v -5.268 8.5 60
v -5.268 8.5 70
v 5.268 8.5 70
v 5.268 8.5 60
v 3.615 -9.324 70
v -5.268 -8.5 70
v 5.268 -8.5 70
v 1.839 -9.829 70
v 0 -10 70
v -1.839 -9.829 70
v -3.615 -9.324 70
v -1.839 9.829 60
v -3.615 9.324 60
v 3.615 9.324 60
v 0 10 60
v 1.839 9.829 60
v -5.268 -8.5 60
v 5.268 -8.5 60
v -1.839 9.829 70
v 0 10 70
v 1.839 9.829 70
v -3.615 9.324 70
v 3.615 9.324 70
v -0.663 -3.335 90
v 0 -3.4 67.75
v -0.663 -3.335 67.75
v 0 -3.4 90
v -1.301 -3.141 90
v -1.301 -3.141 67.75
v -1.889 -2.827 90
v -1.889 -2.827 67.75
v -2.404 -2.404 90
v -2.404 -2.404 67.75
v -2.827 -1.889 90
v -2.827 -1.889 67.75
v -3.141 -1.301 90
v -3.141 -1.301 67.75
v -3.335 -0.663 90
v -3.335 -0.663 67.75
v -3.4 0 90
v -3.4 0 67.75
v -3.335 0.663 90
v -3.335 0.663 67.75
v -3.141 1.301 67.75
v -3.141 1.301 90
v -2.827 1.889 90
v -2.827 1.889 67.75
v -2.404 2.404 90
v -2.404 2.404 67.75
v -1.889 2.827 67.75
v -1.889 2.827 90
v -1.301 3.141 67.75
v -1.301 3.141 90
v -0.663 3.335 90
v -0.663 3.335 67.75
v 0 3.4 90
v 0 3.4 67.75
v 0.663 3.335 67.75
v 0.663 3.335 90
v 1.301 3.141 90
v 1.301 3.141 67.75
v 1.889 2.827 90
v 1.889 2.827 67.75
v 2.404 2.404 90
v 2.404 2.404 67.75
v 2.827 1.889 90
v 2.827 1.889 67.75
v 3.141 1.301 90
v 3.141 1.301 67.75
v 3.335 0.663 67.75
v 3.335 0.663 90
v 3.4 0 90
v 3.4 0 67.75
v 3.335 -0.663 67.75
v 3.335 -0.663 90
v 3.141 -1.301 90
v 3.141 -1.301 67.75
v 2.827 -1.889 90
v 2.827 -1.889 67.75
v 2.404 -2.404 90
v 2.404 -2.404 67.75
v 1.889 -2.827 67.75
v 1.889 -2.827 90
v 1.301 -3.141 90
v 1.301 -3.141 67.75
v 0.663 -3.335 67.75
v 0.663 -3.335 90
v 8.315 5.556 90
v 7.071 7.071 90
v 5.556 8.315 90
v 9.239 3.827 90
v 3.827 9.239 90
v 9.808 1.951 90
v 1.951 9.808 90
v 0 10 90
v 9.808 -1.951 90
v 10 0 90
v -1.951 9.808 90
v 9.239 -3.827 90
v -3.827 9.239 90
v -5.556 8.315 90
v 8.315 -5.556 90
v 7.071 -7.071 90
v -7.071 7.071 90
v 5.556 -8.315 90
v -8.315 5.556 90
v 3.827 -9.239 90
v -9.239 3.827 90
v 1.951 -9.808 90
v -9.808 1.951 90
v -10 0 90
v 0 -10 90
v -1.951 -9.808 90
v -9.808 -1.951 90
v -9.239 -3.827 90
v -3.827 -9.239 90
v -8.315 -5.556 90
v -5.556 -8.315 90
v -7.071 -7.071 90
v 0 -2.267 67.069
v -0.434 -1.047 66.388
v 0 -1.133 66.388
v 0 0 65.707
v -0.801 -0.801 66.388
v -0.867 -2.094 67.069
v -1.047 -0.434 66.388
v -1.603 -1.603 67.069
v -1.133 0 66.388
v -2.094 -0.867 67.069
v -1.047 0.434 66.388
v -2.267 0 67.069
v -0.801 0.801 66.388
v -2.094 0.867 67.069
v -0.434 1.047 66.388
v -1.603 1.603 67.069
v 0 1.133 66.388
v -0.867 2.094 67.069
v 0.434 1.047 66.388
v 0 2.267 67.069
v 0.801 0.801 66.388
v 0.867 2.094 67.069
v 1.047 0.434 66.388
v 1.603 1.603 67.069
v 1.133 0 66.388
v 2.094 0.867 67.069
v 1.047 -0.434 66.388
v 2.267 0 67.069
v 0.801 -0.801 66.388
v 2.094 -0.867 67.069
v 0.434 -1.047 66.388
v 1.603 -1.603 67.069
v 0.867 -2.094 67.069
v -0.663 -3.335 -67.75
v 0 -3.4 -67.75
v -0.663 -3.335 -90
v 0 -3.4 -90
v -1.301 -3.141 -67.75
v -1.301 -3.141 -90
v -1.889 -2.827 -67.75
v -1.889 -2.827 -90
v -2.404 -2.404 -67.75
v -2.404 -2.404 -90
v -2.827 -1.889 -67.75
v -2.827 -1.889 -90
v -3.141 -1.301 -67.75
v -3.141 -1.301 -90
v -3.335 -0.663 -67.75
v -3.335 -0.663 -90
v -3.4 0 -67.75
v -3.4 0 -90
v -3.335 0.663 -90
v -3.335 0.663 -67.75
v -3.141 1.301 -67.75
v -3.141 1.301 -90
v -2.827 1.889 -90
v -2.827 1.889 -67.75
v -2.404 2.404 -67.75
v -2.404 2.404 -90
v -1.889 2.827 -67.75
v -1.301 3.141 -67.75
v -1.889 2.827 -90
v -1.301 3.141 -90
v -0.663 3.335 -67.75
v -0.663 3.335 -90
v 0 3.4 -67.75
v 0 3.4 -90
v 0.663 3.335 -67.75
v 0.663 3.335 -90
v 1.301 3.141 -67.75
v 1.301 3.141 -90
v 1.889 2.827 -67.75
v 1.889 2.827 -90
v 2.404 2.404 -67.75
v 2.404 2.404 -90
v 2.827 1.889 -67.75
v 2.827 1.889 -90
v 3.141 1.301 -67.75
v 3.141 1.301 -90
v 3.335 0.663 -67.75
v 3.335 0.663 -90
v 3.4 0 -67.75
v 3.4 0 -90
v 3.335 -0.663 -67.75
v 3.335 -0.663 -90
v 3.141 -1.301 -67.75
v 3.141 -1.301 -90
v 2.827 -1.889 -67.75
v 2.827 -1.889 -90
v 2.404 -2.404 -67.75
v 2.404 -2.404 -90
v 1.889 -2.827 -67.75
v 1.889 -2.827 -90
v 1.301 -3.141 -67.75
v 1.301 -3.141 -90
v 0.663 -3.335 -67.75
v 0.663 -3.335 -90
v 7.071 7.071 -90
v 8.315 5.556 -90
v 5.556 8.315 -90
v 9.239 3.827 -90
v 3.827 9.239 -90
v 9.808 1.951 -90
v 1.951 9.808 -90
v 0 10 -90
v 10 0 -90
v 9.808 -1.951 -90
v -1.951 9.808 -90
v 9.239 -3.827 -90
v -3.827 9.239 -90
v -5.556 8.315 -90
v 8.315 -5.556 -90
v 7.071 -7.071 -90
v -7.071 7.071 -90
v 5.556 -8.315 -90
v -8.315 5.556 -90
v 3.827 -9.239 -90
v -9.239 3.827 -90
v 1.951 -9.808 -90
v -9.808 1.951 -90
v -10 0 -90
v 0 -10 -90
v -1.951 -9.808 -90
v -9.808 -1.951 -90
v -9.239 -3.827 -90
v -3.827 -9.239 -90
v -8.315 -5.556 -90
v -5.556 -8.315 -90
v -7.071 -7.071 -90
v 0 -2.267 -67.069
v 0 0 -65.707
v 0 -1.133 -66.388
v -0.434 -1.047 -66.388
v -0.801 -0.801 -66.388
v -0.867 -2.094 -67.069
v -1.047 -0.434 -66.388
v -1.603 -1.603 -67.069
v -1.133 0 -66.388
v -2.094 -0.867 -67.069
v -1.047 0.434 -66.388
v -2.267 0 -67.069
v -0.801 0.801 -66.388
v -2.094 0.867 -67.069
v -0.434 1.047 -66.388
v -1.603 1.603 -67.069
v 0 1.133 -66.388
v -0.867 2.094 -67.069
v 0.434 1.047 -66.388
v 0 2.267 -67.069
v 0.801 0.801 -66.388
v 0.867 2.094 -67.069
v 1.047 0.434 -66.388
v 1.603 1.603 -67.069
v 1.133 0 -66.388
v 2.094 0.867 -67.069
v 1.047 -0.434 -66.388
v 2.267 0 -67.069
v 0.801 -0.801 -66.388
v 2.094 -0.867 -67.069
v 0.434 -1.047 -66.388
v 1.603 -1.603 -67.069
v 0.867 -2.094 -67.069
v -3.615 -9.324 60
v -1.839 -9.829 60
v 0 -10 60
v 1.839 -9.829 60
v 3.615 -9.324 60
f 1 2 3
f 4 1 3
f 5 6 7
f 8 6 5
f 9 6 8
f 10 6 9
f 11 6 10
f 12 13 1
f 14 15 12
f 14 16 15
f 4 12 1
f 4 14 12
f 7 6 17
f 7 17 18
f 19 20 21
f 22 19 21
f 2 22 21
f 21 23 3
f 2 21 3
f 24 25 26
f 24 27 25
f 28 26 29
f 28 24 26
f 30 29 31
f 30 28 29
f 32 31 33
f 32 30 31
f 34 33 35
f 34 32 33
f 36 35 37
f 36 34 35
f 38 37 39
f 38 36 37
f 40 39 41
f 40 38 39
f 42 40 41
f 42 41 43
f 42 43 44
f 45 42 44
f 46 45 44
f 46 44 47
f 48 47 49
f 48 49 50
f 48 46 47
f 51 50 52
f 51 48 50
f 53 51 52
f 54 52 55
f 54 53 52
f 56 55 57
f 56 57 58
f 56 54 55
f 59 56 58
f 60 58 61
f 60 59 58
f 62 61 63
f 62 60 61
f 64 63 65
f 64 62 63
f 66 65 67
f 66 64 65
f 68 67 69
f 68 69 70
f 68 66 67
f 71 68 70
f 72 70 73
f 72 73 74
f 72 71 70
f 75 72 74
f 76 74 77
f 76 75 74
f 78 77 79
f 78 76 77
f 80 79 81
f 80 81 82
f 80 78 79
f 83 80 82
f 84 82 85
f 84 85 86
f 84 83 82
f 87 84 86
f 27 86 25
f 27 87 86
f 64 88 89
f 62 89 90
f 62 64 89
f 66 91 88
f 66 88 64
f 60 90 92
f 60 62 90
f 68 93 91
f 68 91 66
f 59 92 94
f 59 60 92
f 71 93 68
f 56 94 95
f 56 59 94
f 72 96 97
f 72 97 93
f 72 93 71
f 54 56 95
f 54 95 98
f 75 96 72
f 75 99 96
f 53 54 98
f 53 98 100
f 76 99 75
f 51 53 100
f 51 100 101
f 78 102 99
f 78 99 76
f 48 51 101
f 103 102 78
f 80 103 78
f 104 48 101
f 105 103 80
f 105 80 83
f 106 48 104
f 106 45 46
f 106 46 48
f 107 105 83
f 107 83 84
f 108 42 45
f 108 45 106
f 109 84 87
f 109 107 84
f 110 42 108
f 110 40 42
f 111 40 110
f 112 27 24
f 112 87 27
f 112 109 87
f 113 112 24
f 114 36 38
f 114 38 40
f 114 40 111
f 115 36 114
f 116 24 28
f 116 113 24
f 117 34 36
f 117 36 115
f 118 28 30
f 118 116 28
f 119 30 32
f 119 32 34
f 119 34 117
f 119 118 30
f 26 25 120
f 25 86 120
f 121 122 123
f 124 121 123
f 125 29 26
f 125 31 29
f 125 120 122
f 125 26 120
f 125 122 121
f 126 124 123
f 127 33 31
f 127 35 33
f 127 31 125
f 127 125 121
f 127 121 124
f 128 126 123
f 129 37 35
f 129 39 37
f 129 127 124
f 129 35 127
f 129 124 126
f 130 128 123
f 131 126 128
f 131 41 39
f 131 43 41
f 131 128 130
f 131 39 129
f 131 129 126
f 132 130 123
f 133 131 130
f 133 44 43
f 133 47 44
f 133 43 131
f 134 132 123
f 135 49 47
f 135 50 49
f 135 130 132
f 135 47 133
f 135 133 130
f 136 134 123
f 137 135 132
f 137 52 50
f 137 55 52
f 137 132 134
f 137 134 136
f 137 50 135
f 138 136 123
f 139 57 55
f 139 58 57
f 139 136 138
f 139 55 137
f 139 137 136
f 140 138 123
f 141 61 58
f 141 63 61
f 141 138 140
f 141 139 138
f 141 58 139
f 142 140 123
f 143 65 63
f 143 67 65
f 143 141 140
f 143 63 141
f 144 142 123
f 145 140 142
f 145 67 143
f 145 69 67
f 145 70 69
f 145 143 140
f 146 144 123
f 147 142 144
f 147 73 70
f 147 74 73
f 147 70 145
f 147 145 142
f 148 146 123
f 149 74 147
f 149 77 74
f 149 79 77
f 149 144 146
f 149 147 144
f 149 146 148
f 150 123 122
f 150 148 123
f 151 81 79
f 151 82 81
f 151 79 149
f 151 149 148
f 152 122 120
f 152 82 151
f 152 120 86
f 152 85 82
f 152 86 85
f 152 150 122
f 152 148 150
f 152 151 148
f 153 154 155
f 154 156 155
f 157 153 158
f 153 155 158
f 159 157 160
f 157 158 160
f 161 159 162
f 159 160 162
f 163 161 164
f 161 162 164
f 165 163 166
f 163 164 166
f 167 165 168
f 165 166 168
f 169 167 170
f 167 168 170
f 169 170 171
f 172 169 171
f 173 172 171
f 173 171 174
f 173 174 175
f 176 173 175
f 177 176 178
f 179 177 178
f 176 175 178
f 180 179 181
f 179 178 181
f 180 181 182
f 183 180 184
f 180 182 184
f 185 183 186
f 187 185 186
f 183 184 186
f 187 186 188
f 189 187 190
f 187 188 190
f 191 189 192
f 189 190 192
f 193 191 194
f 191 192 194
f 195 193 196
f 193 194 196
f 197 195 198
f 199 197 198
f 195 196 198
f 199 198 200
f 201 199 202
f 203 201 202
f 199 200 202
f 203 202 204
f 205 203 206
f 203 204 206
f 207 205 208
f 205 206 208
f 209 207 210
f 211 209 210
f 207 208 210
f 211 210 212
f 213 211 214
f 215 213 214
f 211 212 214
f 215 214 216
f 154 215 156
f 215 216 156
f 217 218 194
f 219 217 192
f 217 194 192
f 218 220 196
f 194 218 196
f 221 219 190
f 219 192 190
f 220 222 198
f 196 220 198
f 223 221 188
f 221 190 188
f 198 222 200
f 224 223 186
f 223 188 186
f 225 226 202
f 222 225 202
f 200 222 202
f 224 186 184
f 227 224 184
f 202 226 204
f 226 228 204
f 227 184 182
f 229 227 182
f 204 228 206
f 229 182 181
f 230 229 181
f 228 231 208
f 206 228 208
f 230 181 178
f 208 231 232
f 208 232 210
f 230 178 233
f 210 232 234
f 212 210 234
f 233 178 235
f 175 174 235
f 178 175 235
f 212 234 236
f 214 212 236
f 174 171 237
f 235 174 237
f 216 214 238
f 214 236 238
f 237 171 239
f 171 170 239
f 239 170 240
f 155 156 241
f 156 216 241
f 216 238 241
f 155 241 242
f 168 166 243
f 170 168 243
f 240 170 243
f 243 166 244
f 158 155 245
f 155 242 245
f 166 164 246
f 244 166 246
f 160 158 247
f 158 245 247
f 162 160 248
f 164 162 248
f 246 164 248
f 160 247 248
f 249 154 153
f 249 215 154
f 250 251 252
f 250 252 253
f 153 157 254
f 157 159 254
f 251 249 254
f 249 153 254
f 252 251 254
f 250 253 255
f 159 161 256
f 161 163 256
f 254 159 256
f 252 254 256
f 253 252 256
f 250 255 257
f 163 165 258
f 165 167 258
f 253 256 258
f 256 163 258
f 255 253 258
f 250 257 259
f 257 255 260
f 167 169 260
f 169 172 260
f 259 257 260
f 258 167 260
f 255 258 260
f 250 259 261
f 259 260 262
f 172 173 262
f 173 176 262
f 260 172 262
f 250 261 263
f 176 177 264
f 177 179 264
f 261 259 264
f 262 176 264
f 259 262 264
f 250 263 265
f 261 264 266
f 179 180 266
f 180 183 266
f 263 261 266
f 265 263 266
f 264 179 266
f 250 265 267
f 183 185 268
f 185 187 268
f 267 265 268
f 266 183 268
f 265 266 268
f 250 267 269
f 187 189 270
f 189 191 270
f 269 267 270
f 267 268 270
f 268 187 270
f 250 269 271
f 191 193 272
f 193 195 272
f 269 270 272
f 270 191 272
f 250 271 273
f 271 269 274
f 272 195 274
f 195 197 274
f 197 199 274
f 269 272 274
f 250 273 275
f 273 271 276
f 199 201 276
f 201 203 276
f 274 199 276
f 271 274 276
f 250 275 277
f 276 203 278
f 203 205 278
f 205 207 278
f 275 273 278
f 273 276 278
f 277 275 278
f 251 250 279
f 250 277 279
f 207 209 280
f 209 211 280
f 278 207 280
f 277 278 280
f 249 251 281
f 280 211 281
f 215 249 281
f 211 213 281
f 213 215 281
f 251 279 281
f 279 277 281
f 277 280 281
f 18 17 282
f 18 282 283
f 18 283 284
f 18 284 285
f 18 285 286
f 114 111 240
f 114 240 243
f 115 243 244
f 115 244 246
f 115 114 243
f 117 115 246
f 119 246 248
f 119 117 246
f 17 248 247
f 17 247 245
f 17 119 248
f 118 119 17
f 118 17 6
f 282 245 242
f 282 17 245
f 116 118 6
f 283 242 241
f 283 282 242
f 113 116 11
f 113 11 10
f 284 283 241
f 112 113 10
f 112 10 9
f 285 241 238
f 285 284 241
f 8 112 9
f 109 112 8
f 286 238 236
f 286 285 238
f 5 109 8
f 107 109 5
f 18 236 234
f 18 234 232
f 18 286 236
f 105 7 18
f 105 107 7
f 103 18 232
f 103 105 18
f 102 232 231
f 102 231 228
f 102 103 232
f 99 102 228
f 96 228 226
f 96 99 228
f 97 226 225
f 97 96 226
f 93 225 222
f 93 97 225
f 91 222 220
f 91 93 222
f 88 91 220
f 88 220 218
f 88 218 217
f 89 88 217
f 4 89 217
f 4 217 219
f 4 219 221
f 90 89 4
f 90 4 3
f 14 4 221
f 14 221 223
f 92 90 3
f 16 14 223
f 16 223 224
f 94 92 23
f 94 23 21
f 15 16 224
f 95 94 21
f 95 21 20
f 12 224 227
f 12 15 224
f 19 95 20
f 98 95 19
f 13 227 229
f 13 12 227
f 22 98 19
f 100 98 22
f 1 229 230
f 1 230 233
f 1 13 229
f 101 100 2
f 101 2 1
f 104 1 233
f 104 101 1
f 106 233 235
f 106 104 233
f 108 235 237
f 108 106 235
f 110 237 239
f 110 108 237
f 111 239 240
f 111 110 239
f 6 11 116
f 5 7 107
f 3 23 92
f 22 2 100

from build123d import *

# Parameters (mm, degrees)
SKIZZE1_R                       = 10
BASIS_LINEAR_AUSTRAGEN_DEPTH    = 90
SKIZZE5_W                       = 10.535653752
SKIZZE5_H                       = 1.5
SCHNITT_LINEAR_AUSTRAGEN1_DEPTH = 10


with BuildPart() as part:
    # Skizze1 → Basis-Linear austragen (new, symmetric)
    with BuildSketch(Plane.XY):
        with Locations(Location((0, 0, 0), (0, 0, 180))):
            Circle(SKIZZE1_R)
    extrude(amount=BASIS_LINEAR_AUSTRAGEN_DEPTH, both=True)

    # Skizze2 → M8 Gewindebohrung1 (revolve, cut)
    with BuildSketch(Plane(origin=(0, 0, 90), x_dir=(0, -1, 0), z_dir=(1, 0, 0))):
        Polygon((0, 0), (0, 24.292926105), (3.4, 22.25), (3.4, 0), align=None)
    m8_gewindebohrung1 = revolve(axis=Axis((0, 0, 96.35), (0, 0, -1)), mode=Mode.SUBTRACT)

    # Skizze5 → Schnitt-Linear austragen1 (cut)
    with BuildSketch(Plane.XY.offset(70)):
        with Locations((0, 9.25)):
            Rectangle(SKIZZE5_W, SKIZZE5_H)
        with Locations((0, -9.25)):
            Rectangle(SKIZZE5_W, SKIZZE5_H)
    extrude(amount=-SCHNITT_LINEAR_AUSTRAGEN1_DEPTH, mode=Mode.SUBTRACT)

    # Spiegeln1: M8 Gewindebohrung1 across plane
    add(m8_gewindebohrung1.mirror(Plane.XY), mode=Mode.SUBTRACT)


solid = part.part
